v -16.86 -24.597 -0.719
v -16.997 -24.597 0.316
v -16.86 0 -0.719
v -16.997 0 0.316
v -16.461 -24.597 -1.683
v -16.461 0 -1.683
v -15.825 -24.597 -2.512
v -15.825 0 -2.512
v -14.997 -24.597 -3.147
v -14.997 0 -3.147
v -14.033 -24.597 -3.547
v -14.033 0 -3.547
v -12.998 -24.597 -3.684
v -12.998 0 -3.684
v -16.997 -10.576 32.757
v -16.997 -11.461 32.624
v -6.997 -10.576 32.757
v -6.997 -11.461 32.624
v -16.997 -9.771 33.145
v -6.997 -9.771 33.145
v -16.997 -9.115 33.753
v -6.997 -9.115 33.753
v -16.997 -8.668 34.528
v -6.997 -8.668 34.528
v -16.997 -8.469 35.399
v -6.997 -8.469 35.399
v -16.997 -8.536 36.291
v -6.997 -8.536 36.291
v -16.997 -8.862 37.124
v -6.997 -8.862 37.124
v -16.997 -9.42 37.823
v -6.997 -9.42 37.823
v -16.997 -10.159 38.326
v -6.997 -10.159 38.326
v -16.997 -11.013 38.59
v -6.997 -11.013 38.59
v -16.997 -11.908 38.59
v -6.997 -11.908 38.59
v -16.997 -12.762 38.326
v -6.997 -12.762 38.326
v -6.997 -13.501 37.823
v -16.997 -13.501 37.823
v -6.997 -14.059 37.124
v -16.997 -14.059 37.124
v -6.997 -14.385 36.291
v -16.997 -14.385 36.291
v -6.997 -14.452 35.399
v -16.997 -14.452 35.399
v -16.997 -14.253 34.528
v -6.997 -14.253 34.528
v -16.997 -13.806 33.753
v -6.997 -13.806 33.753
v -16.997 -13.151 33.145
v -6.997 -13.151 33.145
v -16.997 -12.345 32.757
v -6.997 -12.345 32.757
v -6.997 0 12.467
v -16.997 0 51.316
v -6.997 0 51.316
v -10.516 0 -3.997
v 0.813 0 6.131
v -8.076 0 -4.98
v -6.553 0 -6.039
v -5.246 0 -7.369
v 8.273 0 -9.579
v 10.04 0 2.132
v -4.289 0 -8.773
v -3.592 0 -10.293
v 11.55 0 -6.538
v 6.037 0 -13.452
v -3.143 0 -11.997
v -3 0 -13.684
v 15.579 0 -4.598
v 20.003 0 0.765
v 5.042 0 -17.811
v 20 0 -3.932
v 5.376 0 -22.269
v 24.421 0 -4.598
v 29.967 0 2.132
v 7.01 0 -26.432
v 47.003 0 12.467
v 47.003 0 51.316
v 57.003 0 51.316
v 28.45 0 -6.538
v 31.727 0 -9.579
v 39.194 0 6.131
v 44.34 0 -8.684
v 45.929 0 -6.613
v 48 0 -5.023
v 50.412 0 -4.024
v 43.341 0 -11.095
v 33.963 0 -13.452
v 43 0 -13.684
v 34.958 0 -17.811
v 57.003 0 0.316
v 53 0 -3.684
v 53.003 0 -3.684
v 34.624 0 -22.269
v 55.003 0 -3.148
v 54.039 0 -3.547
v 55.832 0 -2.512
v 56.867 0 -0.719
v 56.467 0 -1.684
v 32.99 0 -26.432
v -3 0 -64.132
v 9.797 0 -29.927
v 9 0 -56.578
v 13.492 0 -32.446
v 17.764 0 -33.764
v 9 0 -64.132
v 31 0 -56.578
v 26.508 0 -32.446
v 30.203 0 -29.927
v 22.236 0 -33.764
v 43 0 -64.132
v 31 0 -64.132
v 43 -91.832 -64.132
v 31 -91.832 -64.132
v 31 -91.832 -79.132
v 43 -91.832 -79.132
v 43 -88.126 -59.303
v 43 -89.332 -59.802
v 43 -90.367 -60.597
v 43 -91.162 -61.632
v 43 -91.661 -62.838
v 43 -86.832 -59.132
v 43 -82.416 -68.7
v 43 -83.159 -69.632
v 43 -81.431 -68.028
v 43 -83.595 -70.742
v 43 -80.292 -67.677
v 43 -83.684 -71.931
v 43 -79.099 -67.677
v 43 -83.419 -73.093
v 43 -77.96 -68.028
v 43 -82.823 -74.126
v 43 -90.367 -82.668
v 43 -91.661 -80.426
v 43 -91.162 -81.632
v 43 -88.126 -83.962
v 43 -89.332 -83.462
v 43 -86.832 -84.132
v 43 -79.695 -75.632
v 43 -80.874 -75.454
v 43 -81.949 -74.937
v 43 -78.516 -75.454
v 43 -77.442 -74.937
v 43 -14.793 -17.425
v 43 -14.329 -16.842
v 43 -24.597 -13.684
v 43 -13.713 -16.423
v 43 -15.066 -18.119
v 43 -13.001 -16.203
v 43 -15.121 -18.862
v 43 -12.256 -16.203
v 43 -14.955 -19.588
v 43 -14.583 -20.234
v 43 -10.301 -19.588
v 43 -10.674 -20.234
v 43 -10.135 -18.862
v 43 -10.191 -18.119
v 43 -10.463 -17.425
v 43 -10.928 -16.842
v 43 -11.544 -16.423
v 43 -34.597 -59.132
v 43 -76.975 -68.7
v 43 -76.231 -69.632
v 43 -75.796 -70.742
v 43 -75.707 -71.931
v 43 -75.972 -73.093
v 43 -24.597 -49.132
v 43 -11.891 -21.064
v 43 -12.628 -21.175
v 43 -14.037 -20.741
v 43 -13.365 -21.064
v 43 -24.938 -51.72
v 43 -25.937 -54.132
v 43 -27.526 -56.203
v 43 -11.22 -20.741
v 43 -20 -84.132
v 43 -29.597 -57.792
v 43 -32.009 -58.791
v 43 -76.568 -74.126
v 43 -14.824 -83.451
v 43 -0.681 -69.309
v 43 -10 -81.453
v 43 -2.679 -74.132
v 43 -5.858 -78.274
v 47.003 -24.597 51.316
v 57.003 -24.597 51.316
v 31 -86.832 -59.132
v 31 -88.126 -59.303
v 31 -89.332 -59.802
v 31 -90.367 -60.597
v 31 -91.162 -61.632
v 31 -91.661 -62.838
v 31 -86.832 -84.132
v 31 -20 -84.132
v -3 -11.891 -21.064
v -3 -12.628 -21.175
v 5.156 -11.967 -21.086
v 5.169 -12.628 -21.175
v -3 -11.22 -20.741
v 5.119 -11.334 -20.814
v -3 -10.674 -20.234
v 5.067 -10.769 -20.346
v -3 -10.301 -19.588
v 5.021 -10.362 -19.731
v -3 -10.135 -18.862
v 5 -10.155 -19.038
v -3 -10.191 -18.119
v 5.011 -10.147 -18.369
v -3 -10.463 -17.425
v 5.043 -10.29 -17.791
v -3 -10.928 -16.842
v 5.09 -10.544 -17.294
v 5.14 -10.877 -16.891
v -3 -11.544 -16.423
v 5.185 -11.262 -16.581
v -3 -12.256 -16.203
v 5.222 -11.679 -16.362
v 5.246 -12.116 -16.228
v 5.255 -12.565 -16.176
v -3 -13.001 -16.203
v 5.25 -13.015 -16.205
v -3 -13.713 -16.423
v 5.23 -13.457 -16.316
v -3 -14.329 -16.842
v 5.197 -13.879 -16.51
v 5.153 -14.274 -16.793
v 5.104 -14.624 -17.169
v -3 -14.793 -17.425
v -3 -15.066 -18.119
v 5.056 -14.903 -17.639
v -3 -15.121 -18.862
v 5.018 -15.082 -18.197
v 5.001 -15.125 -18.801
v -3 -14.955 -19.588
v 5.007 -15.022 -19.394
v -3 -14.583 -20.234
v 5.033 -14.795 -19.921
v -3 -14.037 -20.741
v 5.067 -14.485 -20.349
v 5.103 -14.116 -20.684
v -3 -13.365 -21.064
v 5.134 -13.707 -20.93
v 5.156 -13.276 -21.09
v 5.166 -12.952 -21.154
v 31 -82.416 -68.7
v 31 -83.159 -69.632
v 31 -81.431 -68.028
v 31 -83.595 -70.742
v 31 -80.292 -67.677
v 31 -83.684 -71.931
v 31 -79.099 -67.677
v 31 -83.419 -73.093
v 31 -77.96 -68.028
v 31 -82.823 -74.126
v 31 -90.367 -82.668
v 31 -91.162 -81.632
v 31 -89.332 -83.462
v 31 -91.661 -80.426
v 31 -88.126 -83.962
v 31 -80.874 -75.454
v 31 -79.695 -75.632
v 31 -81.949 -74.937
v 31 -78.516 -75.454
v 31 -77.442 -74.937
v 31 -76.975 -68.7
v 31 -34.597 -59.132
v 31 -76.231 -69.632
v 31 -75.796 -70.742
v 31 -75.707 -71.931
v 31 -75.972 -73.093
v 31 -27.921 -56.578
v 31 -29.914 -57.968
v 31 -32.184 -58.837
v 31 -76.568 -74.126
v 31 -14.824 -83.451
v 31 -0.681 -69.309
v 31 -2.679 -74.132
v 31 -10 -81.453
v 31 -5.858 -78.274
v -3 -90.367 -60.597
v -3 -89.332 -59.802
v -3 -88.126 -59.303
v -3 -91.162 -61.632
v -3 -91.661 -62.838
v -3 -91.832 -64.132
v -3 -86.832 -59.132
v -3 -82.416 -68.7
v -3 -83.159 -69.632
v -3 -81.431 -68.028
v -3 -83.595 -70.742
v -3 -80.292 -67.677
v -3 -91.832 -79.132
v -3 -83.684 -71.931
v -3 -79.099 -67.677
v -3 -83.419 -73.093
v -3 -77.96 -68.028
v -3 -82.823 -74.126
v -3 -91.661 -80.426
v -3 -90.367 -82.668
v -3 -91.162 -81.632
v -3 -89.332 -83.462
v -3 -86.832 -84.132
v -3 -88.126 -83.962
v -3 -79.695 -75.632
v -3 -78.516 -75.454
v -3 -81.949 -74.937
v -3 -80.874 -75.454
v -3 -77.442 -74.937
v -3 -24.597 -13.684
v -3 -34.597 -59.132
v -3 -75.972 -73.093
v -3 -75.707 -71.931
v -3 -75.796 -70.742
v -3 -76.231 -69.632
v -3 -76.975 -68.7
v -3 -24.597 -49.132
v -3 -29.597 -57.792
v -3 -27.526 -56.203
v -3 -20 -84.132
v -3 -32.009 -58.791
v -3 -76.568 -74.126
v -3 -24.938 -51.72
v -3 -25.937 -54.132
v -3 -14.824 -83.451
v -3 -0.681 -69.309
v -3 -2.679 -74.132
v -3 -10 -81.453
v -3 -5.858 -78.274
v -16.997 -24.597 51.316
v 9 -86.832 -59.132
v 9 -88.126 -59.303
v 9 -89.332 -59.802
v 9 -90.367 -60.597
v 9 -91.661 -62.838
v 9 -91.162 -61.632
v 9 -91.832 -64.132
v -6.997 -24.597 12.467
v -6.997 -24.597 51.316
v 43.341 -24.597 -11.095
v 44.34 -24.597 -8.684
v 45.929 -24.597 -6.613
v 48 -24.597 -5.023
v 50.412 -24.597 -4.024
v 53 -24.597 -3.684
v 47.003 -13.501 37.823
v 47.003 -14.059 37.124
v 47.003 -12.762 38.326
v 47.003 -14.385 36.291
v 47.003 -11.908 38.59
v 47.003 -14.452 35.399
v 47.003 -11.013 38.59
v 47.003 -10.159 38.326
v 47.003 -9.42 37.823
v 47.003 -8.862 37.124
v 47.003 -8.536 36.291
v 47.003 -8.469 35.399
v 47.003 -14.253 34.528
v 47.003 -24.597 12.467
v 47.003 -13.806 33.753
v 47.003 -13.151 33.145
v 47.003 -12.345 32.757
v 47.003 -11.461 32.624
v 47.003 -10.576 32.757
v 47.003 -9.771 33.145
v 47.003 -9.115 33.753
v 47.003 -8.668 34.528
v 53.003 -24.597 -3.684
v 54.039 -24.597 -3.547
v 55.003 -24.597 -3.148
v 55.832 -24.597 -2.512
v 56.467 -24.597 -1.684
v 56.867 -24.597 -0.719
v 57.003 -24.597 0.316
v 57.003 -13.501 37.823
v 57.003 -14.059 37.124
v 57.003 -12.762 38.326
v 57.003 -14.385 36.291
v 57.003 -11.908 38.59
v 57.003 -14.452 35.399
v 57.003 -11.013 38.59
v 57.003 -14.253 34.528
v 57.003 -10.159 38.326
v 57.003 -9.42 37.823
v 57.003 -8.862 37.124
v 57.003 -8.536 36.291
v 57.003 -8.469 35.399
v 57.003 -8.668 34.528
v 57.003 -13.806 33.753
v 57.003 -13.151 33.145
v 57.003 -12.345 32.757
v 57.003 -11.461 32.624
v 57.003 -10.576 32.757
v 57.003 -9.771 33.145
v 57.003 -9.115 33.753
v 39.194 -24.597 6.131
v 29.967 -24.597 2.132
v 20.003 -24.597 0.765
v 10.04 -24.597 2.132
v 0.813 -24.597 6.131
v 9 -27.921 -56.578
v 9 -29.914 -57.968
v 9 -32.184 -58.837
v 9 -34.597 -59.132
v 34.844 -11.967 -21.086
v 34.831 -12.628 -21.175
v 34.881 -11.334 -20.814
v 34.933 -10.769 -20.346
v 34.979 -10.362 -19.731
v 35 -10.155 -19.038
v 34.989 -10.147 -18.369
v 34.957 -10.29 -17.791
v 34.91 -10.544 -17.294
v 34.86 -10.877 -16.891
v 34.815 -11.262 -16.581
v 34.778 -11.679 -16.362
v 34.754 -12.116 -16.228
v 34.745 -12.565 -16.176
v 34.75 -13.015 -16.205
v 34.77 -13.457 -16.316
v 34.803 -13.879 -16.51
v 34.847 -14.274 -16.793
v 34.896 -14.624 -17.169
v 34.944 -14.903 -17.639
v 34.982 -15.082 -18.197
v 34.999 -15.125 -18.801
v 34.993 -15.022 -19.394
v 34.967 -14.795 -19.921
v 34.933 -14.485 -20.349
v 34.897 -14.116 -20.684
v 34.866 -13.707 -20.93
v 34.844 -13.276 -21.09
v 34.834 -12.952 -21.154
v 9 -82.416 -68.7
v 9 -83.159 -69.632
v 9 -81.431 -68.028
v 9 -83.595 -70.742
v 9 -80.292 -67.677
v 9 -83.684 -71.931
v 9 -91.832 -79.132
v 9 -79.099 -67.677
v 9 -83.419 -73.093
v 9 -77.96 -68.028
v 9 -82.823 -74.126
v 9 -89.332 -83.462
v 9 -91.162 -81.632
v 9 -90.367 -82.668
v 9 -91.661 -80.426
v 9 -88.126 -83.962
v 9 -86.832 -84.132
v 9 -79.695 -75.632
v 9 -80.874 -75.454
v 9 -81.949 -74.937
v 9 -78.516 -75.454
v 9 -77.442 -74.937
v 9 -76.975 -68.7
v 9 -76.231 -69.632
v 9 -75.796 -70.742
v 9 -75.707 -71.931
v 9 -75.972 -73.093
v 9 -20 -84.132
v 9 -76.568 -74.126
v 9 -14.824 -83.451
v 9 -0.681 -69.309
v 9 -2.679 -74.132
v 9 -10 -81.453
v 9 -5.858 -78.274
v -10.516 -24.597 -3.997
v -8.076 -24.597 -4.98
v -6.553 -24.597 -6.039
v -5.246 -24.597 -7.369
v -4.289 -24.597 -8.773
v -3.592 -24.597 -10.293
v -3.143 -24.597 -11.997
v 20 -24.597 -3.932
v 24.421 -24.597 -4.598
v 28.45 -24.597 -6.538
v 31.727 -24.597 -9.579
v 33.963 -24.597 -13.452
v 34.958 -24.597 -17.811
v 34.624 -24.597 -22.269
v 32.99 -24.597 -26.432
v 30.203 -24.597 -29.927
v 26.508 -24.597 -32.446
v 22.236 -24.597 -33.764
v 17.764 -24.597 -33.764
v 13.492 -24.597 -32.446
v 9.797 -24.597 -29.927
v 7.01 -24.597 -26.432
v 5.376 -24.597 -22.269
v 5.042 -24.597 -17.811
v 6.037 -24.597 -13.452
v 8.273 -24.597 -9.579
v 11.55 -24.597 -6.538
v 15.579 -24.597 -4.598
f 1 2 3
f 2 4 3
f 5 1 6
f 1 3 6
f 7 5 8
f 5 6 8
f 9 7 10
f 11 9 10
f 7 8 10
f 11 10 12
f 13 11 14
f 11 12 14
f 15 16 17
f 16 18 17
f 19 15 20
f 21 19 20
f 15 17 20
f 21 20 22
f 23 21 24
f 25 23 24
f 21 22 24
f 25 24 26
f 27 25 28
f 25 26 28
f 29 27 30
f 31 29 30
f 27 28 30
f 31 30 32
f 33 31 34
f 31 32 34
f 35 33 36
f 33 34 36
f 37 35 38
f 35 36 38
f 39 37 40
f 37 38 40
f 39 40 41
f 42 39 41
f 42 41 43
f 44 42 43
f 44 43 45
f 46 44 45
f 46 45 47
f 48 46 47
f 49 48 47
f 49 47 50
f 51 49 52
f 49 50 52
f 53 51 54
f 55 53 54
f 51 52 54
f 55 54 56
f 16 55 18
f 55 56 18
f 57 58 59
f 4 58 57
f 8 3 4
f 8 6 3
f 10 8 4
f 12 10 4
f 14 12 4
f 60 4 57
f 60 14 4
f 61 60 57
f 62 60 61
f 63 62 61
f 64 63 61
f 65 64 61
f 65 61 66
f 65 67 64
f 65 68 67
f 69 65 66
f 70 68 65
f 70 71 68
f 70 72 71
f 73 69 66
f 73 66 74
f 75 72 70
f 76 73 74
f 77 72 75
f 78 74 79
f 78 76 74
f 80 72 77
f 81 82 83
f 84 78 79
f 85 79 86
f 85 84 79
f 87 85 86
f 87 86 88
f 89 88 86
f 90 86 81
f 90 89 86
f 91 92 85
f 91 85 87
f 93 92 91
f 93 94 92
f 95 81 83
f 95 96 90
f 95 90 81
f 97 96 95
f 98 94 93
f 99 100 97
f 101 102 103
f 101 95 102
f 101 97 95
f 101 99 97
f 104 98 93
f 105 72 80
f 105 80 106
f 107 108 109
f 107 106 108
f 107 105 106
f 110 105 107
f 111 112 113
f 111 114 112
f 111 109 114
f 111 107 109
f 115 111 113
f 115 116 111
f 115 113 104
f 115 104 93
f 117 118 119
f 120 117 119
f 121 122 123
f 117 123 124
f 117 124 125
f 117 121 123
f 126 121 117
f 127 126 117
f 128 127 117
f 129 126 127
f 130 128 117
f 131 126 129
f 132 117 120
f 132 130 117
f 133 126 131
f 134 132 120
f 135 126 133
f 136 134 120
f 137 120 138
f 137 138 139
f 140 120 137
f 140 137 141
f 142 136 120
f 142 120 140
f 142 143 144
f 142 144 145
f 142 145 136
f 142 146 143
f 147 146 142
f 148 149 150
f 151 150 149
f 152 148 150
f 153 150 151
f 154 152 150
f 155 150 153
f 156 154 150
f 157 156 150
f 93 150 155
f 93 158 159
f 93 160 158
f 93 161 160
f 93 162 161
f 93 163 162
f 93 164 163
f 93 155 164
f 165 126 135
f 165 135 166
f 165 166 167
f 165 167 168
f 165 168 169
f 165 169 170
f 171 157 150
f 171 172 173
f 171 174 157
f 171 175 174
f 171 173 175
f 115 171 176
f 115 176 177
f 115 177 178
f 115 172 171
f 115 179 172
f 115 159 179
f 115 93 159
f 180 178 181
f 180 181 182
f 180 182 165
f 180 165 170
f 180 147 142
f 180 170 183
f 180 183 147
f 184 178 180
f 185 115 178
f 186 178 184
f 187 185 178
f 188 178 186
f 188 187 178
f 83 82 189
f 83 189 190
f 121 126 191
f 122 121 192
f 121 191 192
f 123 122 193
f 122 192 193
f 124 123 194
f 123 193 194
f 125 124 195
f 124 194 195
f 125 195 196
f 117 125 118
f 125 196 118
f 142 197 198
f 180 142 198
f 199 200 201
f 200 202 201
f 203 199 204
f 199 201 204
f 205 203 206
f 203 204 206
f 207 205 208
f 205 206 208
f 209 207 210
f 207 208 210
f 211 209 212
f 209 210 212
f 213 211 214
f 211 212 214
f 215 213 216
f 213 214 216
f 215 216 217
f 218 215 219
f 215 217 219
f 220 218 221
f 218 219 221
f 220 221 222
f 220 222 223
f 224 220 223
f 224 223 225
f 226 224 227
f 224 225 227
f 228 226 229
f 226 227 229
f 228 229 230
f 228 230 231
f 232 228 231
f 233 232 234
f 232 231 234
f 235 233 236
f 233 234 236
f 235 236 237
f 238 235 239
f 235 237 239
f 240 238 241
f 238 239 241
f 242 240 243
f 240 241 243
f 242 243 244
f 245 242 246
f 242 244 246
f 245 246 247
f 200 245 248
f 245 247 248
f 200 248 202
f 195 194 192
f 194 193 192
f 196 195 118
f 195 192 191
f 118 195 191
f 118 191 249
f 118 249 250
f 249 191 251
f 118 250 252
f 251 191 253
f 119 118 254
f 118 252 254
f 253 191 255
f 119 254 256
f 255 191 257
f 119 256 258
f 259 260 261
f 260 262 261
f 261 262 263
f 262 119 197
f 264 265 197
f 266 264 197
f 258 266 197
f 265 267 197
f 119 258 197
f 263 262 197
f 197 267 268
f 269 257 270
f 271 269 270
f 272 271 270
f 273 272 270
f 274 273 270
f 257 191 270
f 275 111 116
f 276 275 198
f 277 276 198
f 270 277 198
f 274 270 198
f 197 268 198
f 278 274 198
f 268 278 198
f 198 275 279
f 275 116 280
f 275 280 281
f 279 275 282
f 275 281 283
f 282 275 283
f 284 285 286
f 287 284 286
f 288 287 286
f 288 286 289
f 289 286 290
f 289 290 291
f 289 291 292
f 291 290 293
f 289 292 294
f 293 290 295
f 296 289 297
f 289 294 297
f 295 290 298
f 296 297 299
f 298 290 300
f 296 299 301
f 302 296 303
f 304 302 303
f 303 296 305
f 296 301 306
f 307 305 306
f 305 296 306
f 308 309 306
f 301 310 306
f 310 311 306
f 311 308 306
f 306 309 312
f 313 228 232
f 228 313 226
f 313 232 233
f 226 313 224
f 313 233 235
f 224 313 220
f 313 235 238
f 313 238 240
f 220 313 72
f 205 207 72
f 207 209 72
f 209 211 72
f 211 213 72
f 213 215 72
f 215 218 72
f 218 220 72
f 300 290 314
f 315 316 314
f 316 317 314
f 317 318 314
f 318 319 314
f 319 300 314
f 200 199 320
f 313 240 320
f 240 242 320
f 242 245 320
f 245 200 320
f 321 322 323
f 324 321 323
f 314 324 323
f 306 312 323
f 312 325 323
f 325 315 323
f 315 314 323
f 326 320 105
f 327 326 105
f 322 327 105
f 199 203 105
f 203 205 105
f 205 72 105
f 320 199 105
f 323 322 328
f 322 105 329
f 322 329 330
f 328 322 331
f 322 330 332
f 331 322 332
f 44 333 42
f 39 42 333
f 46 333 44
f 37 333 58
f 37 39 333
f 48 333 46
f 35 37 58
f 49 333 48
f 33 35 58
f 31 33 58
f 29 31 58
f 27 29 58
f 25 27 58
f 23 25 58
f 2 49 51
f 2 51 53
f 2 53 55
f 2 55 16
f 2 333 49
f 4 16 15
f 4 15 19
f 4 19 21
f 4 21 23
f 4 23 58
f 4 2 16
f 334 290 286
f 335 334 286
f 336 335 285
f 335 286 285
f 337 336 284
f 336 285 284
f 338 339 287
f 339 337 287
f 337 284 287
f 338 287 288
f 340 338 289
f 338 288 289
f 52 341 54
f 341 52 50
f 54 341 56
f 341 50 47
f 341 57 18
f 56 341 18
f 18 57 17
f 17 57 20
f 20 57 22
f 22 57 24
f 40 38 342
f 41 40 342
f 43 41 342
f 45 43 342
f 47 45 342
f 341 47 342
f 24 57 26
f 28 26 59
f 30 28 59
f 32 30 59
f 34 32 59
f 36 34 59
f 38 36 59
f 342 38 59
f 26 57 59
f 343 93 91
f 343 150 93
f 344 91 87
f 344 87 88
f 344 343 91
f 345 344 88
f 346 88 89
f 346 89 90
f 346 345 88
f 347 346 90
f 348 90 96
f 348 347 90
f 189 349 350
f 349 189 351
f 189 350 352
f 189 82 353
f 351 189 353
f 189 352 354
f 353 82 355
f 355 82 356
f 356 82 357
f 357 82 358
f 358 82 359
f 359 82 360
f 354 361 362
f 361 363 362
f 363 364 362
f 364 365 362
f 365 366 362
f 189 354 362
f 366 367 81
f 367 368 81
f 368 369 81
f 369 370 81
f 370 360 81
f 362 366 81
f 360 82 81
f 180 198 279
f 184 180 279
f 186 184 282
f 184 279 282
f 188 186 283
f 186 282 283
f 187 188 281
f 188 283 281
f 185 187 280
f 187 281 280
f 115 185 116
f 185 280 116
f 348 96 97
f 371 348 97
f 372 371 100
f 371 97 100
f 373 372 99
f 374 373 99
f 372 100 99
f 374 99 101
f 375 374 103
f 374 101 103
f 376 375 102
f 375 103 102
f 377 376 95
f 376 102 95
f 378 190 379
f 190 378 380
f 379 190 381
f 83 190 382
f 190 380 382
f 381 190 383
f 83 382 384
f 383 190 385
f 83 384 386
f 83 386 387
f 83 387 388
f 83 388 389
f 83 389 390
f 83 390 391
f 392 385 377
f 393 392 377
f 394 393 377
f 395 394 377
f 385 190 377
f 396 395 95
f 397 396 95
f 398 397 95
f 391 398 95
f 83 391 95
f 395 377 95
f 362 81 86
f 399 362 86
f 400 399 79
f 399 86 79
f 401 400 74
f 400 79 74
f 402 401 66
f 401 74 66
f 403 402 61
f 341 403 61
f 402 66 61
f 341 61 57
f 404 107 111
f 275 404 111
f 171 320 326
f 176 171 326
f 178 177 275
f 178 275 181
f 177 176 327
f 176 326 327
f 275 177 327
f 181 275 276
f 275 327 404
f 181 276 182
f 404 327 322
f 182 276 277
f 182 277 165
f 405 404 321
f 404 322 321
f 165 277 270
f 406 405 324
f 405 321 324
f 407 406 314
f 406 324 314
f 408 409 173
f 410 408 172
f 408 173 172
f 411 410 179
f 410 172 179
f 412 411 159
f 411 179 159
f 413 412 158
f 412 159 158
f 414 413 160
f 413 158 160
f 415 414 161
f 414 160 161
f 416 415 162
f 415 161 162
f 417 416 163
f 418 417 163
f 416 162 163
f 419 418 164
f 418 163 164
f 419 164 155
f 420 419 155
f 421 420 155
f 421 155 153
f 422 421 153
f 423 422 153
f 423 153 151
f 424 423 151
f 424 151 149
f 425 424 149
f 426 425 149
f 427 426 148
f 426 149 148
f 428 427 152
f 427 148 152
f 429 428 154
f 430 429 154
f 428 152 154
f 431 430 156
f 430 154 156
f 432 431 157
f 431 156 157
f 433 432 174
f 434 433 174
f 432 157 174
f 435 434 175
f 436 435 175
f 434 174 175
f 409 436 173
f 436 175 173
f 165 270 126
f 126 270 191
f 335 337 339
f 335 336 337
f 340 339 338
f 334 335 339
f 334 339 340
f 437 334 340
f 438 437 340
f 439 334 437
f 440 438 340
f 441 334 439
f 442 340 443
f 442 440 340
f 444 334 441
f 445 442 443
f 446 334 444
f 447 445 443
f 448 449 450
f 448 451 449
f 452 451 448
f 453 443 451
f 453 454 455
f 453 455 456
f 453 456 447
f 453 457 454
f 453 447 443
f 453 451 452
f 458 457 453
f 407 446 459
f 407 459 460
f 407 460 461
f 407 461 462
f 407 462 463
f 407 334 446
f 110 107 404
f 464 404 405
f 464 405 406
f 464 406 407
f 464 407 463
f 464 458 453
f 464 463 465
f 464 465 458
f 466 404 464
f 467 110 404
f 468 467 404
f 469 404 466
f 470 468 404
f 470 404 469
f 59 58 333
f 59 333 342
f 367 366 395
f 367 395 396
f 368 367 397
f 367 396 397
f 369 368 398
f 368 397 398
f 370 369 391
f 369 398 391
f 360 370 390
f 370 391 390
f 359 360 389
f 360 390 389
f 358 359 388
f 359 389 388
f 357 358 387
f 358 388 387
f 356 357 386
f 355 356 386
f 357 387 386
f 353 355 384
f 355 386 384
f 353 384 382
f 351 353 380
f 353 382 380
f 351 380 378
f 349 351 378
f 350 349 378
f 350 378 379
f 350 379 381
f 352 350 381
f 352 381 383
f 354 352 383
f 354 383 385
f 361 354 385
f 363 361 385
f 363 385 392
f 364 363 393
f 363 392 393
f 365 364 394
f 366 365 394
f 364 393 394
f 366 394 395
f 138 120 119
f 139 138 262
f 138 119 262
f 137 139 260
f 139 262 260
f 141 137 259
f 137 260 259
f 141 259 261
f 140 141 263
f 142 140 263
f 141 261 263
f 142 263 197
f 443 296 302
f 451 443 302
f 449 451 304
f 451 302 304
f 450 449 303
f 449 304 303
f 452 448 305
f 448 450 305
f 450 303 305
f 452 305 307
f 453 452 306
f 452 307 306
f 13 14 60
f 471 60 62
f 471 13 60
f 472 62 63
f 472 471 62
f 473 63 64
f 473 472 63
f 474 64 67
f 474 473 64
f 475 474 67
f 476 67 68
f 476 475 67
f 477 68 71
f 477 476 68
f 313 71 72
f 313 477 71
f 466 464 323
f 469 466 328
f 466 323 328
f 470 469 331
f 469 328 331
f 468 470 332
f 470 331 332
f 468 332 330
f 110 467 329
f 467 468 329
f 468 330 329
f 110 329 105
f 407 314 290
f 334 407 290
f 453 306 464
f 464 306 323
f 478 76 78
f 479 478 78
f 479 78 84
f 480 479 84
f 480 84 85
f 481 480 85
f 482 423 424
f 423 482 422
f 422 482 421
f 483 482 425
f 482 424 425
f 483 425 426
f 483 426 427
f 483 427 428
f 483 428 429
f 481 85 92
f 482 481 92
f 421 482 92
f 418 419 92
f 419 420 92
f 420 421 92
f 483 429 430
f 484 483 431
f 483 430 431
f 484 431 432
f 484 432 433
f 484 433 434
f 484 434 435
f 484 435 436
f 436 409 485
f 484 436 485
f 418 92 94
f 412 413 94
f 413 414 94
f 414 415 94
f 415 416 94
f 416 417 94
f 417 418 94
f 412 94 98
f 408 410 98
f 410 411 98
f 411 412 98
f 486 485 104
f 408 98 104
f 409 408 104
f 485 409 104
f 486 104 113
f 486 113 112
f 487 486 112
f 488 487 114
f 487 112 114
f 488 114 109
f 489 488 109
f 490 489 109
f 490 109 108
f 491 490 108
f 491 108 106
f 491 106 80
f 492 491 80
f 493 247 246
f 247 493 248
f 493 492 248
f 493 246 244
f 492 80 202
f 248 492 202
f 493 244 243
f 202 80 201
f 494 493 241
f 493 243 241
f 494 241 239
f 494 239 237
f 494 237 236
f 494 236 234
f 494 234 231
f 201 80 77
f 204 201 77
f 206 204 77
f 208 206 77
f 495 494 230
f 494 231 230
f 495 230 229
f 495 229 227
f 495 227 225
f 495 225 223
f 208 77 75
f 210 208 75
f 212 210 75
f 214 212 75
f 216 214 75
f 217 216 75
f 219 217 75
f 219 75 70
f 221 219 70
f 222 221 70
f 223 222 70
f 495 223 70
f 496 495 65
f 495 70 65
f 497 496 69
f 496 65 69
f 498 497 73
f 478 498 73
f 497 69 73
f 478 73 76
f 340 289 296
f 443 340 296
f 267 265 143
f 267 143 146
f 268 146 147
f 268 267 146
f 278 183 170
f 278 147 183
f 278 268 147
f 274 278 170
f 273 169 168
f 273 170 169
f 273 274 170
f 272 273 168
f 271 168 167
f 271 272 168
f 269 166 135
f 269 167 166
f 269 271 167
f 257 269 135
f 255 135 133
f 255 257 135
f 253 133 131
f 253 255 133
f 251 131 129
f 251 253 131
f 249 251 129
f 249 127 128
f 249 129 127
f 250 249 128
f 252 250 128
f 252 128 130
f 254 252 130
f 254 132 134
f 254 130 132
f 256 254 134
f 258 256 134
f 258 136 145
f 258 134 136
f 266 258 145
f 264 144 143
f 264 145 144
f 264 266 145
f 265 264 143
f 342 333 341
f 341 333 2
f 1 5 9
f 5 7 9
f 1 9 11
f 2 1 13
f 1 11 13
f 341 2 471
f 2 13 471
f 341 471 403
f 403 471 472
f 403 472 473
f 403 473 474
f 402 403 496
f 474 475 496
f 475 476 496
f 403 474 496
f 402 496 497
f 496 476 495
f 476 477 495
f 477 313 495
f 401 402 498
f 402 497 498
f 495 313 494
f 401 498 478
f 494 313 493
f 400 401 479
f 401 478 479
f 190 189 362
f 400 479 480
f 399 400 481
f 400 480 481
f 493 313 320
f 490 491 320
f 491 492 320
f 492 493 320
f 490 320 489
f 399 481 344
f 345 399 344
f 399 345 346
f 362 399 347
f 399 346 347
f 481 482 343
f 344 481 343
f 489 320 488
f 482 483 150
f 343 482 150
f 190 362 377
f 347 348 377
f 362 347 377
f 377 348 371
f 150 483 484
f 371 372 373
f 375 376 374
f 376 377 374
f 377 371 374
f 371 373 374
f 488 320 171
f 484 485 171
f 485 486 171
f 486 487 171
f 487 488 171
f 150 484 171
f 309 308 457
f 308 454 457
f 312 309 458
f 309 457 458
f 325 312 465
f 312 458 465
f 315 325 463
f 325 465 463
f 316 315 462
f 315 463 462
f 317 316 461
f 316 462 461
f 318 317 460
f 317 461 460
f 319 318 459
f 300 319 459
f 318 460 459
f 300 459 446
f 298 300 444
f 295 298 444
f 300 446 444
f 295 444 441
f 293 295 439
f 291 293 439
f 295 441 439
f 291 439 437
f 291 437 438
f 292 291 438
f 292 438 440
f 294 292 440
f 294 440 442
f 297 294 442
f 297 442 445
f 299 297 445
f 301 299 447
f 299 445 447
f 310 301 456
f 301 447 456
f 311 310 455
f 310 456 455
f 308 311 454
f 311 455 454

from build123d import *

# Parameters (mm, degrees)
EXTRUDE_START         = -3
EXTRUDE_1_DEPTH       = 46
SKETCH_2_R            = 15
SKETCH_2_W            = 22
SKETCH_2_H            = 41.003909118
CUT_EXTRUDE_2_DEPTH   = 120
SKETCH_3_R            = 4
SKETCH_3_R_2          = 2.5
CUT_EXTRUDE_1_DEPTH   = 55
SKETCH_4_W            = 74
SKETCH_4_H            = 24.59688775
EXTRUDE_3_DEPTH       = 55
CUT_EXTRUDE_2_2_DEPTH = 50
FILLET_2_R            = 4
SKETCH_7_R            = 3
CUT_EXTRUDE_3_DEPTH   = 90
FILLET_3_R            = 10


with BuildPart() as part:
    # Эскиз1 → Вытянуть1 (new body)
    with BuildSketch(Plane(origin=(0, 0, 0), x_dir=(0, 0, -1), z_dir=(1, 0, 0)).offset(EXTRUDE_START)):
        with BuildLine():
            Line((3.683652722, 0), (3.683652722, -24.59688775))
            Line((3.683652722, -24.59688775), (49.132150834, -24.59688775))
            ThreePointArc((49.132150834, -24.59688775), (56.203219269, -27.52582056), (59.132150834, -34.59688951))
            Line((59.132150834, -34.59688951), (59.132141638, -86.831595085))
            ThreePointArc((59.132141638, -86.831595085), (60.596607421, -90.36712956), (64.132141638, -91.831595966))
            Line((64.132141638, -91.831595966), (79.132150834, -91.831595966))
            ThreePointArc((79.132150834, -91.831595966), (82.66768474, -90.367129871), (84.132150834, -86.831595966))
            Line((84.132150834, -86.831595966), (84.132150834, -20))
            ThreePointArc((84.132150834, -20), (78.274286458, -5.857864376), (64.132150834, 0))
            Line((64.132150834, 0), (3.683652722, 0))
        make_face()
    extrude(amount=EXTRUDE_1_DEPTH)

    # Эскиз2 → Cut-Extrude 2 (cut, symmetric)
    with BuildSketch(Plane(origin=(0, 0, 0), x_dir=(1, 0, 0), z_dir=(0, 1, 0))):
        with Locations(Location((20, 18.931682227, 0), (0, 0, 270))):
            Circle(SKETCH_2_R)
        with Locations((20, 77.079487522)):
            Rectangle(SKETCH_2_W, SKETCH_2_H)
    extrude(amount=CUT_EXTRUDE_2_DEPTH, both=True, mode=Mode.SUBTRACT)

    # Эскиз3 → Вырез-Вытянуть1 (cut, symmetric)
    with BuildSketch(Plane(origin=(0, 0, 0), x_dir=(0, 0, -1), z_dir=(1, 0, 0))):
        with Locations((71.632122158, -79.695359499)):
            Circle(SKETCH_3_R)
        with Locations((18.675004926, -12.628238718)):
            Circle(SKETCH_3_R_2)
    extrude(amount=CUT_EXTRUDE_1_DEPTH, both=True, mode=Mode.SUBTRACT)

    # Эскиз4 → Вытянуть3 (add)
    with BuildSketch(Plane.XY.offset(-3.683652722)):
        with Locations((20.003387868, -12.298443875)):
            Rectangle(SKETCH_4_W, SKETCH_4_H)
    extrude(amount=EXTRUDE_3_DEPTH)

    # Эскиз6 → Cut-Extrude 2 2 (cut, symmetric)
    with BuildSketch(Plane(origin=(0, 0, 0), x_dir=(1, 0, 0), z_dir=(0, 1, 0))):
        with BuildLine():
            Line((47.003387868, -53.712819086), (47.003387868, -12.467045061))
            ThreePointArc((47.003387868, -12.467045061), (20.003387863, -0.765266352), (-6.996612132, -12.467045083))
            Line((-6.996612132, -12.467045083), (-6.996612132, -53.712819086))
            Line((-6.996612132, -53.712819086), (47.003387868, -53.712819086))
        make_face()
    extrude(amount=CUT_EXTRUDE_2_2_DEPTH, both=True, mode=Mode.SUBTRACT)

    # Скругление2
    fillet_2_edges = [part.edges().sort_by_distance(p)[0] for p in [
        (57.003387868, -12.298443875, -3.683652722),
        (-16.996612132, -12.298443875, -3.683652722),
    ]]
    fillet(fillet_2_edges, radius=FILLET_2_R)

    # Эскиз7 → Вырез-Вытянуть3 (cut, symmetric)
    with BuildSketch(Plane(origin=(57.003387868, 0, 0), x_dir=(0, 0, -1), z_dir=(1, 0, 0))):
        with Locations((-35.623538585, -11.460561108)):
            Circle(SKETCH_7_R)
    extrude(amount=CUT_EXTRUDE_3_DEPTH, both=True, mode=Mode.SUBTRACT)

    # Скругление3
    fillet_3_edges = [part.edges().sort_by_distance(p)[0] for p in [
        (-3, -12.298443875, -3.683652722),
        (43, -12.298443875, -3.683652722),
    ]]
    fillet(fillet_3_edges, radius=FILLET_3_R)


solid = part.part
